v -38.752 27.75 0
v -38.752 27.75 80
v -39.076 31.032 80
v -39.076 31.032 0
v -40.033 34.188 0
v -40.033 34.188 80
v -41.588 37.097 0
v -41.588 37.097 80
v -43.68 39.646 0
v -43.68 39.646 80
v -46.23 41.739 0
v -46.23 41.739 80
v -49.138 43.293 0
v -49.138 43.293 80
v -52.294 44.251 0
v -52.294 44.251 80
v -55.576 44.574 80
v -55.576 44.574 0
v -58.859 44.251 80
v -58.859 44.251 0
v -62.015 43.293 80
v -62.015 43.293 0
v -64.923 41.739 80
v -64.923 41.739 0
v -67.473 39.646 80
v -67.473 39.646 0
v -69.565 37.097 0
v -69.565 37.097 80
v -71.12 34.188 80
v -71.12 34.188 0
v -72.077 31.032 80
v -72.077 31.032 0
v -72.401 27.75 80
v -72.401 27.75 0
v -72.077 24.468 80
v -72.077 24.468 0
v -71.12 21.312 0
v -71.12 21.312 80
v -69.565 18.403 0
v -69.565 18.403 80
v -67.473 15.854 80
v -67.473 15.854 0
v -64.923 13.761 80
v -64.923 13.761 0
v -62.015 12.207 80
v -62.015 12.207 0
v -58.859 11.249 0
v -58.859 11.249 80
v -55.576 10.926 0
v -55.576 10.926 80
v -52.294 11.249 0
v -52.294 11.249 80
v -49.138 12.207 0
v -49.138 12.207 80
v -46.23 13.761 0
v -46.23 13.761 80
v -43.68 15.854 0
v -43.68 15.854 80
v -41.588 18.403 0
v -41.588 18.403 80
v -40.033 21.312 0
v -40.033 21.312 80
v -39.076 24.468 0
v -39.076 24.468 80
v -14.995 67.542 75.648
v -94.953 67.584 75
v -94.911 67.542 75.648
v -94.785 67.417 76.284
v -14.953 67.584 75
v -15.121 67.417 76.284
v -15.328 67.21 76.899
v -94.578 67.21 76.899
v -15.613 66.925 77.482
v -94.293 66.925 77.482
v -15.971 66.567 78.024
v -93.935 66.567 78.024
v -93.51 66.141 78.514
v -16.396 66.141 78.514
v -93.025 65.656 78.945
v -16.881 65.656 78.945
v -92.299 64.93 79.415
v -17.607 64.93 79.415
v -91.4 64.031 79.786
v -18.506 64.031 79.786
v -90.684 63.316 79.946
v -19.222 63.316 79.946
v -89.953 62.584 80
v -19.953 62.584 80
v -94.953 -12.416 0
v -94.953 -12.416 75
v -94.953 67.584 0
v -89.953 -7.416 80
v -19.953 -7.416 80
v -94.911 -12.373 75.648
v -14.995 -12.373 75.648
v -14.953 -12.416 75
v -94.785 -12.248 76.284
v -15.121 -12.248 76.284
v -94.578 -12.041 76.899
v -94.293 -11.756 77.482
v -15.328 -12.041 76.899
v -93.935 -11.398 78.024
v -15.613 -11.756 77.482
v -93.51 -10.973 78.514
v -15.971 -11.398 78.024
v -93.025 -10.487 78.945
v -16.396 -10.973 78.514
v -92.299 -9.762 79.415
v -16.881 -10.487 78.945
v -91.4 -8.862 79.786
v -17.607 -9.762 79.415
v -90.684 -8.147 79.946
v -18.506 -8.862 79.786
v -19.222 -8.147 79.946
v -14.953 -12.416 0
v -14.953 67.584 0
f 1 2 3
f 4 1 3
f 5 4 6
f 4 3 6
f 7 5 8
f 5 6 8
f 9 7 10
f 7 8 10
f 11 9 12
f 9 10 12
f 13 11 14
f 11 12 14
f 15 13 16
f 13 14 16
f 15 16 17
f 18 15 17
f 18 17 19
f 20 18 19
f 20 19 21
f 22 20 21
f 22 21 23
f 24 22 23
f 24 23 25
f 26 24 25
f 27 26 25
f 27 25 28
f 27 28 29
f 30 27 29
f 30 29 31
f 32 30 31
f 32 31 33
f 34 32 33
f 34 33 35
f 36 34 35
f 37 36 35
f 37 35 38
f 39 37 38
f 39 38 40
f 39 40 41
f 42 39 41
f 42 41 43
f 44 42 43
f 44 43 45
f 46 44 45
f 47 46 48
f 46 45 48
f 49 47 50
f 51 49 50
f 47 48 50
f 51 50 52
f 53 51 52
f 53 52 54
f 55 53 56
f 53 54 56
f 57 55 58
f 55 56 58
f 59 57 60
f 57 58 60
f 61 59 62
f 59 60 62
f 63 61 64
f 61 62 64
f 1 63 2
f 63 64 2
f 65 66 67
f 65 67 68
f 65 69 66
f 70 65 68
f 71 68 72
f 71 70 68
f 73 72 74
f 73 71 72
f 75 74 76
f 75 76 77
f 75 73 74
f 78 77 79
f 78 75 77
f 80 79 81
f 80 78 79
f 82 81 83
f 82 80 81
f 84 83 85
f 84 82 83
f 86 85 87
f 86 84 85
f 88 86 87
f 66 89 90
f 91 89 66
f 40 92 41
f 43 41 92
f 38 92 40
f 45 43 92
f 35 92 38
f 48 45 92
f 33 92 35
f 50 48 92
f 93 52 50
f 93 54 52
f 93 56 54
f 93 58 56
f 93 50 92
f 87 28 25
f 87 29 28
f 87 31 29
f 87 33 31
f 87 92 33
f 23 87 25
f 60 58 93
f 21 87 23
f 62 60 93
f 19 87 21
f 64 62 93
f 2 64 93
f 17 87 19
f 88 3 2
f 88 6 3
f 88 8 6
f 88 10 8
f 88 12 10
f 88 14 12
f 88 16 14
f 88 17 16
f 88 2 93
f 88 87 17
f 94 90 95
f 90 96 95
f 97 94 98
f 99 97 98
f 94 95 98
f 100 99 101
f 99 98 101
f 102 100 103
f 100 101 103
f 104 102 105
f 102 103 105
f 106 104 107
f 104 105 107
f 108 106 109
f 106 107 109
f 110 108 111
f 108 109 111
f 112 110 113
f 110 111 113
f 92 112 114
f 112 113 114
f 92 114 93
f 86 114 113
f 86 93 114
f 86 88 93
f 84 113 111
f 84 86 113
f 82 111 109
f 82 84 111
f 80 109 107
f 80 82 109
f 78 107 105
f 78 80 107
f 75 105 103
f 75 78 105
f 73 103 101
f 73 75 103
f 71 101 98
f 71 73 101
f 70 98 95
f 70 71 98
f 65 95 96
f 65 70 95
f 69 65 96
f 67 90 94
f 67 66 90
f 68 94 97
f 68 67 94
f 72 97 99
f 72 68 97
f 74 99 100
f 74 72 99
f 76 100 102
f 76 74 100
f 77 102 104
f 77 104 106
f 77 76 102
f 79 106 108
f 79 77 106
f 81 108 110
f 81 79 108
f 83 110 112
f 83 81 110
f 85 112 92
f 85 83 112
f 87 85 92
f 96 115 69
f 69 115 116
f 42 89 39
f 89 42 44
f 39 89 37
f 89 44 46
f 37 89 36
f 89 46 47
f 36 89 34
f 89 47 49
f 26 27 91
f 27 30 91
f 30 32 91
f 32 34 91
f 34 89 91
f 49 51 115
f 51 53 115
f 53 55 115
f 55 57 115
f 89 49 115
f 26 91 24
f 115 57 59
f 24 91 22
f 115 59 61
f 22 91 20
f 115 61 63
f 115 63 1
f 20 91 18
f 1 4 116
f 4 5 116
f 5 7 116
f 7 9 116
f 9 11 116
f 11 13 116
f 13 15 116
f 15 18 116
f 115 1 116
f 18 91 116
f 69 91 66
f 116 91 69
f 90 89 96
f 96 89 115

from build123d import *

# Parameters (mm, degrees)
F0_W     = 80
F0_H     = 80
F1_DEPTH = 80
F2_R     = 16.82409
F3_DEPTH = 80.001
F4_R     = 5


with BuildPart() as f1:
    # F0 (on Top) → F1 (new body)
    with BuildSketch(Plane.XY):
        with Locations((-54.952934, 27.584402)):
            Rectangle(F0_W, F0_H)
    extrude(amount=F1_DEPTH)

    # F2 (on face) → F3 (cut, through all)
    with BuildSketch(Plane.XY.offset(80)):
        with Locations((-55.576466, 27.750002)):
            Circle(F2_R)
    extrude(amount=-F3_DEPTH, mode=Mode.SUBTRACT)

    # F4
    f4_edges = [f1.edges().sort_by_distance(p)[0] for p in [
        (-54.952934, 67.584402, 80),
        (-94.952934, 27.584402, 80),
        (-54.952934, -12.415598, 80),
        (-14.952934, 27.584402, 80),
    ]]
    fillet(f4_edges, radius=F4_R)


solid = f1.part
